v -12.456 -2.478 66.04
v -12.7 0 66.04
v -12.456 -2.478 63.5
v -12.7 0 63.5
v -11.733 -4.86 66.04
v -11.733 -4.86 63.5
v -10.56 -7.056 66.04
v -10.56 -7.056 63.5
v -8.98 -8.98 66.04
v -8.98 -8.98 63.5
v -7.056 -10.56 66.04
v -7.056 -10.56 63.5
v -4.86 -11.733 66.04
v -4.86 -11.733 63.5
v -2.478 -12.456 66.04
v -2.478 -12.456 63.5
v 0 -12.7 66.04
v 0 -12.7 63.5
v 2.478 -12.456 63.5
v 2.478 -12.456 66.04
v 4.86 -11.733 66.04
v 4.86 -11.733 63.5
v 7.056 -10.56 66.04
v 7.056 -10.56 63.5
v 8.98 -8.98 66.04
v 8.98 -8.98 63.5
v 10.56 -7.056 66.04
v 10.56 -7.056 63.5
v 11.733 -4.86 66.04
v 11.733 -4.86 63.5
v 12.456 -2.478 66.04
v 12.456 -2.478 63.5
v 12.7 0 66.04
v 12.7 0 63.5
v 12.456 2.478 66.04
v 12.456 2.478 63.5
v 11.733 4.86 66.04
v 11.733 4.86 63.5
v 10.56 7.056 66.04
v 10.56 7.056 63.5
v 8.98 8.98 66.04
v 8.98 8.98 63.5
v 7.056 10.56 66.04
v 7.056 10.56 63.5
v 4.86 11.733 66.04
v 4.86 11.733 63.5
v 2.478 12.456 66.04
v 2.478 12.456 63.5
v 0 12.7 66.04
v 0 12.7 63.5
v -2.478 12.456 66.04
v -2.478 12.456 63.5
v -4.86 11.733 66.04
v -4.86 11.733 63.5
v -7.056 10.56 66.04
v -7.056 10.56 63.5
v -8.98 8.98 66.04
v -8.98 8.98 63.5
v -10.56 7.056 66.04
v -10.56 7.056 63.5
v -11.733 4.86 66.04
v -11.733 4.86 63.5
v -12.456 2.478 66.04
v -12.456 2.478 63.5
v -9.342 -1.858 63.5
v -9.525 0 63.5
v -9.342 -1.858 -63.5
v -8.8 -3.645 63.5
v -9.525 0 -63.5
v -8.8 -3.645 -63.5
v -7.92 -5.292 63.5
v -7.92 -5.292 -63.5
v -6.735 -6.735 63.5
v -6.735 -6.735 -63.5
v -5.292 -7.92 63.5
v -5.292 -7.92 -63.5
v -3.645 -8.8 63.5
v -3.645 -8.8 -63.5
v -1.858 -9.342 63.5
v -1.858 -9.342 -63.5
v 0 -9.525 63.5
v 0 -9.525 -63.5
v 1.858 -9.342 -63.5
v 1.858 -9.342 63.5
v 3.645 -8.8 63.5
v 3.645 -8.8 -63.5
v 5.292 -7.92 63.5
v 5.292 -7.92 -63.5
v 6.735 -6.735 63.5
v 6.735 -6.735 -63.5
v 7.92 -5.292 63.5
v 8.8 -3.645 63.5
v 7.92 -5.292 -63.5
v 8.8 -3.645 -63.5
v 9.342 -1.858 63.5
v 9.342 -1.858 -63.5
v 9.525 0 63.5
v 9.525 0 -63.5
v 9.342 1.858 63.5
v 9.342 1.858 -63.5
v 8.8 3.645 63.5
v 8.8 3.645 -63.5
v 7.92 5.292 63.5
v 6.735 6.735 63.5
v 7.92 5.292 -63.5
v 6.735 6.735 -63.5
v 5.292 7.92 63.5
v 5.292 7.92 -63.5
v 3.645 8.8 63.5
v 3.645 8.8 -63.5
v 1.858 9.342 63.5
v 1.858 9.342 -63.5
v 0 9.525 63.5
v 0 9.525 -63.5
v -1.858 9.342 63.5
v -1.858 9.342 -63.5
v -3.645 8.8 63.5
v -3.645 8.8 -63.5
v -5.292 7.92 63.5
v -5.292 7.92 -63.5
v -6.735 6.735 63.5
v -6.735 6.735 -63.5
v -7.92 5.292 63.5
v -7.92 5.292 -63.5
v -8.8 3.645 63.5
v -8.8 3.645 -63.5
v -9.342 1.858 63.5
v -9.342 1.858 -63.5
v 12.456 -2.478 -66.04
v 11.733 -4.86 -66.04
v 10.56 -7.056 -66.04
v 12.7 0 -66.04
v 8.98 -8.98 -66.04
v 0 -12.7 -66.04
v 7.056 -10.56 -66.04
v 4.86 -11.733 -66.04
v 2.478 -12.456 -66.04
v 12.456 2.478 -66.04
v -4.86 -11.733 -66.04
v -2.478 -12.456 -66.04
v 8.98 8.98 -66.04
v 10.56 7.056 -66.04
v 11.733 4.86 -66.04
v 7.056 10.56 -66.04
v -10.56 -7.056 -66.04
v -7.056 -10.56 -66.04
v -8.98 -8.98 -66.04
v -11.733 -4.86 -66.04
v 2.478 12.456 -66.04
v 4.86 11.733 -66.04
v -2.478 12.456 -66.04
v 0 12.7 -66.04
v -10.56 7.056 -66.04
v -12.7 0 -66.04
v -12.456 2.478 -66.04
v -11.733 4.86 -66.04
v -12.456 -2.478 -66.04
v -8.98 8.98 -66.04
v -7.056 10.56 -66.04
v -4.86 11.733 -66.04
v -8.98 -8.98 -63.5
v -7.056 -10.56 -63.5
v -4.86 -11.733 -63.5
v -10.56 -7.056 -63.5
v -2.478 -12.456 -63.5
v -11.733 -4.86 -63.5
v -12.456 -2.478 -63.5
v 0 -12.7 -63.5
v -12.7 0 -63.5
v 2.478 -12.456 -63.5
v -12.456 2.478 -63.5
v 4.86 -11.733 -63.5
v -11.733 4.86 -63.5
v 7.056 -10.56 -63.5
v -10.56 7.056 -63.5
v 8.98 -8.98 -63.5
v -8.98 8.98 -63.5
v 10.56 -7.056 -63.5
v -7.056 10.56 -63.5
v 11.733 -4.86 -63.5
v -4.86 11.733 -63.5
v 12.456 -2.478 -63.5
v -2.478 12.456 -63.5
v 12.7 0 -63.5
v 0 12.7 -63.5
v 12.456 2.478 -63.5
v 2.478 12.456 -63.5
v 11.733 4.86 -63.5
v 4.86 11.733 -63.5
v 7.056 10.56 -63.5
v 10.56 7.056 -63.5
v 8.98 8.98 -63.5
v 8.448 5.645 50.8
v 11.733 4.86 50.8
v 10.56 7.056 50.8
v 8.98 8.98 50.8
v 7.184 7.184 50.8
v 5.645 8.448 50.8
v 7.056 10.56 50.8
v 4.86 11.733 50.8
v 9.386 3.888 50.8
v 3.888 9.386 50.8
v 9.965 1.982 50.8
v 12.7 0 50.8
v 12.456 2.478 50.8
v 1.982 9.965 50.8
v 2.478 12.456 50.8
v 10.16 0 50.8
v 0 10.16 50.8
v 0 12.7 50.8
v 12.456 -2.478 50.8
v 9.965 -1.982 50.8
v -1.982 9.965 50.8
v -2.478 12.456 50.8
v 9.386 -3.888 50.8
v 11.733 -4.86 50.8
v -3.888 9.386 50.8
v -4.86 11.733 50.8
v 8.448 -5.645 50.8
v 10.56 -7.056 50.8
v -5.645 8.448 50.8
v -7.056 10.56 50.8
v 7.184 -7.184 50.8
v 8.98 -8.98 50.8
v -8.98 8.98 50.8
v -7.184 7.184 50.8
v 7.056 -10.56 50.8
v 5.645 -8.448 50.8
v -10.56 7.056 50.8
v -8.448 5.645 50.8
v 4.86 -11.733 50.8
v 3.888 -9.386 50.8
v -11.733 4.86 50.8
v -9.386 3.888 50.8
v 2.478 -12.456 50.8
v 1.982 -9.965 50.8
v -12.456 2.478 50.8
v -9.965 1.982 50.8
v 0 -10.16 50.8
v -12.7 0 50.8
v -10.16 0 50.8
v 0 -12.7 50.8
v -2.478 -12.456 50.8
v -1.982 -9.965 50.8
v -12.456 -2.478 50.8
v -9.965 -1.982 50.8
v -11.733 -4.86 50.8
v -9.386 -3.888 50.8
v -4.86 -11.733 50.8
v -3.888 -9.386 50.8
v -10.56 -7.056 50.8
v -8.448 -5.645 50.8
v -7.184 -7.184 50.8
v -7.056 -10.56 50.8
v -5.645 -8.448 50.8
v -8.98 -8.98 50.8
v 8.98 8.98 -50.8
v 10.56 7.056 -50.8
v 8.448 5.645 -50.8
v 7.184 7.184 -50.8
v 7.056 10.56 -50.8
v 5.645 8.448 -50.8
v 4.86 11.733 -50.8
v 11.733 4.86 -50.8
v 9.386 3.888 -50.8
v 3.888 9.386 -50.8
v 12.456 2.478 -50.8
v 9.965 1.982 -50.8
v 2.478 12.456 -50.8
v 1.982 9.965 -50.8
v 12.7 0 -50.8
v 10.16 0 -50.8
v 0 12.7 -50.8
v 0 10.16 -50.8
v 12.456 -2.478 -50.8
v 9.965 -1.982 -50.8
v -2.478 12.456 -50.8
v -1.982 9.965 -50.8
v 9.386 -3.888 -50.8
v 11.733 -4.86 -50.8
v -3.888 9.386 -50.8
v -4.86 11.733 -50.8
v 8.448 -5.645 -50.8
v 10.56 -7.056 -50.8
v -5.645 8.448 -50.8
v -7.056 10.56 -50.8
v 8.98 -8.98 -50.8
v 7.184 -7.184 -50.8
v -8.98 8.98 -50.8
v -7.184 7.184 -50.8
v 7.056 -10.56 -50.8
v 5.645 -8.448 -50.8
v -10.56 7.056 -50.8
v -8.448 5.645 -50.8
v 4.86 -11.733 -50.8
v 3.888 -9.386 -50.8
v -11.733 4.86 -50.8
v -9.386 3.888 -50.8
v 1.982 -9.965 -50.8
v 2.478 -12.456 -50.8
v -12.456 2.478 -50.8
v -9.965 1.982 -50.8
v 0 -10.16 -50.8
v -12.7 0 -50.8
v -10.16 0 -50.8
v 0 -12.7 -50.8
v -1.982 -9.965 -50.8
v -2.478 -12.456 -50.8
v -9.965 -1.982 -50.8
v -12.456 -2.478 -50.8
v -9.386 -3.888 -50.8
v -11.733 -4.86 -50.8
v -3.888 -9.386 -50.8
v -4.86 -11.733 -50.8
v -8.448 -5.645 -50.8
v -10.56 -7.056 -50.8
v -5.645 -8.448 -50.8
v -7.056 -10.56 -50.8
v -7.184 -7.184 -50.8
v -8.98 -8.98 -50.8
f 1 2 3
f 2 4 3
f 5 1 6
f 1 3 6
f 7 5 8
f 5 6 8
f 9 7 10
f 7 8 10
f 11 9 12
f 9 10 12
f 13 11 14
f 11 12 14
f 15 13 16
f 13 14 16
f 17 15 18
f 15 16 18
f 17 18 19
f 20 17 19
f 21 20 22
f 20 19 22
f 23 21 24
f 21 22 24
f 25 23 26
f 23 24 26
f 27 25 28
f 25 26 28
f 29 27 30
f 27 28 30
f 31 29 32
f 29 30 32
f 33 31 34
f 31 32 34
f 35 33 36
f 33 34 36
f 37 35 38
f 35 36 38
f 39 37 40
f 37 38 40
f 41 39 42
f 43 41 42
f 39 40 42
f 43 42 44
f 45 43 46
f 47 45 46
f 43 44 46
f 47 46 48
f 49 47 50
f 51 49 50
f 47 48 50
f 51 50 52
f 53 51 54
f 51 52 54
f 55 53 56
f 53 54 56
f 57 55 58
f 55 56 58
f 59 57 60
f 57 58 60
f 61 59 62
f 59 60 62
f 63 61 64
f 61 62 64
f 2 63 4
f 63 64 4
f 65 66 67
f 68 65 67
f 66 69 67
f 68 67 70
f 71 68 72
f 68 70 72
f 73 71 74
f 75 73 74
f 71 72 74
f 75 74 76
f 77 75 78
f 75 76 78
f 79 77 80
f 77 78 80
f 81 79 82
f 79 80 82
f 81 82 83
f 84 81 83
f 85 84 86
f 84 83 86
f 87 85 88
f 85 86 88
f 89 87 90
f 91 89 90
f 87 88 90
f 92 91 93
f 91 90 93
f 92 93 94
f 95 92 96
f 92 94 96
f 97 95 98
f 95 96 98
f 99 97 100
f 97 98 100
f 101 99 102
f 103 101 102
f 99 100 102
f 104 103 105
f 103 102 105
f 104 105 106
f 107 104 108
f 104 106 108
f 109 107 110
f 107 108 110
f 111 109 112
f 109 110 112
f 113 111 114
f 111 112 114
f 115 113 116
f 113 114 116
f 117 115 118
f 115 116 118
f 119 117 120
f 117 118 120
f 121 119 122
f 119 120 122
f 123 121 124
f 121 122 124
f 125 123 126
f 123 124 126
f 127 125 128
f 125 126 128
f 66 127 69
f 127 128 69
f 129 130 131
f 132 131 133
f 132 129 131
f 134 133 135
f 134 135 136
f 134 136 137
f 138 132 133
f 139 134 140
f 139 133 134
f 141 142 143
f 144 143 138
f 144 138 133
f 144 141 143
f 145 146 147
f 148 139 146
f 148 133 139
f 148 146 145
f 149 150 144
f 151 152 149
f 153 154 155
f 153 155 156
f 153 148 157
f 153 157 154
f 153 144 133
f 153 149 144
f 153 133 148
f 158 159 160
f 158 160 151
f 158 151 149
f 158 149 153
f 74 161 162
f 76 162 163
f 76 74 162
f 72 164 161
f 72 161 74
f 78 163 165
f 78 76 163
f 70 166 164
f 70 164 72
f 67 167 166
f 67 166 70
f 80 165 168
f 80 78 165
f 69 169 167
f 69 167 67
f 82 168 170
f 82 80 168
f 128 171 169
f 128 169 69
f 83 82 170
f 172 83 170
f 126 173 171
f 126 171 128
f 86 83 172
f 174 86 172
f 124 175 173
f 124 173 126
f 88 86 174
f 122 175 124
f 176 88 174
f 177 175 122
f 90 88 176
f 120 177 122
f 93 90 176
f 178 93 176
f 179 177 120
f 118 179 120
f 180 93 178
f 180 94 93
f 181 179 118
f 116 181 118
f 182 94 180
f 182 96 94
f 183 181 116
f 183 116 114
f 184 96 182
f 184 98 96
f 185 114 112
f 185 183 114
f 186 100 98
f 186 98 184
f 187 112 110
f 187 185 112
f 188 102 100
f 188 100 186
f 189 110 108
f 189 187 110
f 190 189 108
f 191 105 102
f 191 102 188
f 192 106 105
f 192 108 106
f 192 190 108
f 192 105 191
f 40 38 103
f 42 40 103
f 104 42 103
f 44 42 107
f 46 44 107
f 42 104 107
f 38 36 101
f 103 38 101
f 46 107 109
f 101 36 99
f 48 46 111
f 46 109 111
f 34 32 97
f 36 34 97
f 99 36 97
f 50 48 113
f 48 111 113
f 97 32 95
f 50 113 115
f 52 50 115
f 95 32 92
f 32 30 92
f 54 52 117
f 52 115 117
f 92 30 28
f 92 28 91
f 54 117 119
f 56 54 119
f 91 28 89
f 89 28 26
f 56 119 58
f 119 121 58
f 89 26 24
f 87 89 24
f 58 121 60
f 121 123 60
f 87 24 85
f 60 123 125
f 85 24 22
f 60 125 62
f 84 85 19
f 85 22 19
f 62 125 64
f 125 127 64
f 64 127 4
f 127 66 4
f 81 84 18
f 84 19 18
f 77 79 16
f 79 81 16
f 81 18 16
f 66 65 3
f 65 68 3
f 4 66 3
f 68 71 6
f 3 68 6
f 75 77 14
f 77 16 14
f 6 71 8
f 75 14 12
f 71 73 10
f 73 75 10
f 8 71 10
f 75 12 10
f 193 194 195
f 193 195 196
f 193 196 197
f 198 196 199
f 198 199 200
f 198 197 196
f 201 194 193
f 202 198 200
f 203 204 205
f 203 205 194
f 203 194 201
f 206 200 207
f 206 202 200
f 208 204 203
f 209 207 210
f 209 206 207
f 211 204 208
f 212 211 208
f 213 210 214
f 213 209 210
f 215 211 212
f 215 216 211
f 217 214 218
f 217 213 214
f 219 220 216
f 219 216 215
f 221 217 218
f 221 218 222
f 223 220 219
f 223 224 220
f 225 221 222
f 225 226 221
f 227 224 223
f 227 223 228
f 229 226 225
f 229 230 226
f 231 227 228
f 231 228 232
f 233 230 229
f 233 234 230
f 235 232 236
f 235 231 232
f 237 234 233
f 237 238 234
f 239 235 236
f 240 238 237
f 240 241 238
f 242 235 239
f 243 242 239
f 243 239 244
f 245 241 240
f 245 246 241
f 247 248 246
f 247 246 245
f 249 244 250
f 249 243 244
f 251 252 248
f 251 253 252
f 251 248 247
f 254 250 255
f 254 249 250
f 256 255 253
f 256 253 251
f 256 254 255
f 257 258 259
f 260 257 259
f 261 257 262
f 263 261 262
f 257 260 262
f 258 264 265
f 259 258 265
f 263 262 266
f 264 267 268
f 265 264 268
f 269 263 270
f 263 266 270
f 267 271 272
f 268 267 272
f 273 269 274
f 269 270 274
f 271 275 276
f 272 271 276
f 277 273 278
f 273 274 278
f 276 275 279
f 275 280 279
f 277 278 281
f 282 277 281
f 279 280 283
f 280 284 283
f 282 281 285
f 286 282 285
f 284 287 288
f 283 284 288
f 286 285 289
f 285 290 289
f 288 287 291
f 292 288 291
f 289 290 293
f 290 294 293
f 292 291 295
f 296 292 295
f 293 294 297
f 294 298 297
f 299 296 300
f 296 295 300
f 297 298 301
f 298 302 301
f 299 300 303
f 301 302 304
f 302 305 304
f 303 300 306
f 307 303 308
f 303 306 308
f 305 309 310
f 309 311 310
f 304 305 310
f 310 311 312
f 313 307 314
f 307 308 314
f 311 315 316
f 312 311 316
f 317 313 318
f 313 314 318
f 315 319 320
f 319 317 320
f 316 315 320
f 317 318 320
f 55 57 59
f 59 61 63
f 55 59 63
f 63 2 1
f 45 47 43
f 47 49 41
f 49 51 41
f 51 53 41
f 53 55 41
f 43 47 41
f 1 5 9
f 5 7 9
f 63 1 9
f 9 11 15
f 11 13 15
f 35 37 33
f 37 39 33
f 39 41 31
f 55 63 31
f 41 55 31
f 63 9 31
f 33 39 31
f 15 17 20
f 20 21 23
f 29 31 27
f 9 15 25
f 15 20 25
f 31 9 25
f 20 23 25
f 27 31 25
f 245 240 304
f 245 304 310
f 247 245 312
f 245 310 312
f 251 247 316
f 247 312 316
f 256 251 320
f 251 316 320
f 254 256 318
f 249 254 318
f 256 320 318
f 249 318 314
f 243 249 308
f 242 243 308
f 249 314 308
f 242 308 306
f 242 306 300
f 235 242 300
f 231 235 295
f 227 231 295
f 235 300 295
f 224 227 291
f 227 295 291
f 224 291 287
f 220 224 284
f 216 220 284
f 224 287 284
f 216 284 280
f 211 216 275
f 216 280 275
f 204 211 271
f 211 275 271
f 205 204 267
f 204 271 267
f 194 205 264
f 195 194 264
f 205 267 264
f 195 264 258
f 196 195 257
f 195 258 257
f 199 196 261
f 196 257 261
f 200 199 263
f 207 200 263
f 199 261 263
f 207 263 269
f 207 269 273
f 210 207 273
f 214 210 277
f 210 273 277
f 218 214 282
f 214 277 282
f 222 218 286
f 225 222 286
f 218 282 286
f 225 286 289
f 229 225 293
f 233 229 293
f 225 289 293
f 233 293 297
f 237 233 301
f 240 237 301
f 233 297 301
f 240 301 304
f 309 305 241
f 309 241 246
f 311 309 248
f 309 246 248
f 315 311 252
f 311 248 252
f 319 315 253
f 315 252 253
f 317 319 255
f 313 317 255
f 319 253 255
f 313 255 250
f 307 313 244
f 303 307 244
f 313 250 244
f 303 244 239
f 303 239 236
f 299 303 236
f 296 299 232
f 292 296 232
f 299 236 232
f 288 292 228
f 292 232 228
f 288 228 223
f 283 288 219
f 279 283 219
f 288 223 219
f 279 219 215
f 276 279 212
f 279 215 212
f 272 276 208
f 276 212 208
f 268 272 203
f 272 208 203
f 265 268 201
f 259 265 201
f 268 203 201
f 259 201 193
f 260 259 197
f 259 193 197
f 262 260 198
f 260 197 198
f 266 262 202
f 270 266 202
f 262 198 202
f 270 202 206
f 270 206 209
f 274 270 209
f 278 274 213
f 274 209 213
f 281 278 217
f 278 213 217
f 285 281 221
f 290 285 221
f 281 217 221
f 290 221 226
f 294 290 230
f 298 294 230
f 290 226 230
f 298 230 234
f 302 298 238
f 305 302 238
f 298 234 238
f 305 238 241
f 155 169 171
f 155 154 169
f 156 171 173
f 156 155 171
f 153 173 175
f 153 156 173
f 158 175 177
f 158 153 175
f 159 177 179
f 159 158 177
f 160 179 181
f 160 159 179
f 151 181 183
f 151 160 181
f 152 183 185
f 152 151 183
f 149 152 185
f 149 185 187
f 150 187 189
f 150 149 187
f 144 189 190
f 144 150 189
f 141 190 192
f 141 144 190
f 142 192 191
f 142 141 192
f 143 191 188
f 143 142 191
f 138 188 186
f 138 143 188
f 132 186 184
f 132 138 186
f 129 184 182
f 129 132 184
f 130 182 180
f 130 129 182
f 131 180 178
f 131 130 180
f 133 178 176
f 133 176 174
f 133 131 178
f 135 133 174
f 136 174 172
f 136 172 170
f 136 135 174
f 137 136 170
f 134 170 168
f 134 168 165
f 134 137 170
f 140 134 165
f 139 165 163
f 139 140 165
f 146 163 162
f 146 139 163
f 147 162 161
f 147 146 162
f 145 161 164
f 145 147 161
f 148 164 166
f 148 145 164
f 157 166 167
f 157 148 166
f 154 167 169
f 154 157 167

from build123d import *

# Parameters (mm, degrees)
F0_W   = 9.525
F0_H   = 63.5
F0_W_2 = 2.54
F0_H_2 = 50.8


with BuildPart() as f1:
    # F0 (on Front) → F1 (revolve)
    with BuildSketch(Plane.XZ):
        with Locations((-4.7625, 31.75)):
            Rectangle(F0_W, F0_H)
        Polygon((0, -31.75), (0, 0), (-9.525, 0), (-9.525, -31.7036), align=None)
        Polygon((0, -63.5), (0, -31.75), (-9.525, -31.7036), (-9.525, -63.5), align=None)
    revolve(axis=Axis((0, 0, 31.75), (0, 0, 1)))

    # F0 (on Front) → F2 (revolve)
    with BuildSketch(Plane.XZ):
        Polygon((-9.525, 63.5), (0, 63.5), (0, 66.04), (-12.7, 66.04), (-12.7, 63.5), align=None)
    revolve(axis=Axis((0, 0, 64.77), (0, 0, 1)))

    # F0 (on Front) → F3 (revolve)
    with BuildSketch(Plane.XZ):
        Polygon((0, -66.04), (0, -63.5), (-9.525, -63.5), (-12.7, -63.5), (-12.7, -66.04), align=None)
    revolve(axis=Axis((0, 0, -64.77), (0, 0, -1)))


with BuildPart() as f4:
    # F0 (on Front) → F4 (revolve)
    with BuildSketch(Plane.XZ):
        with Locations((-11.429849, 25.4)):
            Rectangle(F0_W_2, F0_H_2)
        Polygon((-12.699849, -31.688134), (-10.159849, -31.700507), (-10.159849, 0), (-12.699849, 0), align=None)
        Polygon((-10.159849, -50.8), (-10.159849, -31.700507), (-12.699849, -31.688134), (-12.699849, -50.8), align=None)
    revolve(axis=Axis((0, 0, 31.75), (0, 0, 1)))


solid = Compound([f1.part, f4.part])
